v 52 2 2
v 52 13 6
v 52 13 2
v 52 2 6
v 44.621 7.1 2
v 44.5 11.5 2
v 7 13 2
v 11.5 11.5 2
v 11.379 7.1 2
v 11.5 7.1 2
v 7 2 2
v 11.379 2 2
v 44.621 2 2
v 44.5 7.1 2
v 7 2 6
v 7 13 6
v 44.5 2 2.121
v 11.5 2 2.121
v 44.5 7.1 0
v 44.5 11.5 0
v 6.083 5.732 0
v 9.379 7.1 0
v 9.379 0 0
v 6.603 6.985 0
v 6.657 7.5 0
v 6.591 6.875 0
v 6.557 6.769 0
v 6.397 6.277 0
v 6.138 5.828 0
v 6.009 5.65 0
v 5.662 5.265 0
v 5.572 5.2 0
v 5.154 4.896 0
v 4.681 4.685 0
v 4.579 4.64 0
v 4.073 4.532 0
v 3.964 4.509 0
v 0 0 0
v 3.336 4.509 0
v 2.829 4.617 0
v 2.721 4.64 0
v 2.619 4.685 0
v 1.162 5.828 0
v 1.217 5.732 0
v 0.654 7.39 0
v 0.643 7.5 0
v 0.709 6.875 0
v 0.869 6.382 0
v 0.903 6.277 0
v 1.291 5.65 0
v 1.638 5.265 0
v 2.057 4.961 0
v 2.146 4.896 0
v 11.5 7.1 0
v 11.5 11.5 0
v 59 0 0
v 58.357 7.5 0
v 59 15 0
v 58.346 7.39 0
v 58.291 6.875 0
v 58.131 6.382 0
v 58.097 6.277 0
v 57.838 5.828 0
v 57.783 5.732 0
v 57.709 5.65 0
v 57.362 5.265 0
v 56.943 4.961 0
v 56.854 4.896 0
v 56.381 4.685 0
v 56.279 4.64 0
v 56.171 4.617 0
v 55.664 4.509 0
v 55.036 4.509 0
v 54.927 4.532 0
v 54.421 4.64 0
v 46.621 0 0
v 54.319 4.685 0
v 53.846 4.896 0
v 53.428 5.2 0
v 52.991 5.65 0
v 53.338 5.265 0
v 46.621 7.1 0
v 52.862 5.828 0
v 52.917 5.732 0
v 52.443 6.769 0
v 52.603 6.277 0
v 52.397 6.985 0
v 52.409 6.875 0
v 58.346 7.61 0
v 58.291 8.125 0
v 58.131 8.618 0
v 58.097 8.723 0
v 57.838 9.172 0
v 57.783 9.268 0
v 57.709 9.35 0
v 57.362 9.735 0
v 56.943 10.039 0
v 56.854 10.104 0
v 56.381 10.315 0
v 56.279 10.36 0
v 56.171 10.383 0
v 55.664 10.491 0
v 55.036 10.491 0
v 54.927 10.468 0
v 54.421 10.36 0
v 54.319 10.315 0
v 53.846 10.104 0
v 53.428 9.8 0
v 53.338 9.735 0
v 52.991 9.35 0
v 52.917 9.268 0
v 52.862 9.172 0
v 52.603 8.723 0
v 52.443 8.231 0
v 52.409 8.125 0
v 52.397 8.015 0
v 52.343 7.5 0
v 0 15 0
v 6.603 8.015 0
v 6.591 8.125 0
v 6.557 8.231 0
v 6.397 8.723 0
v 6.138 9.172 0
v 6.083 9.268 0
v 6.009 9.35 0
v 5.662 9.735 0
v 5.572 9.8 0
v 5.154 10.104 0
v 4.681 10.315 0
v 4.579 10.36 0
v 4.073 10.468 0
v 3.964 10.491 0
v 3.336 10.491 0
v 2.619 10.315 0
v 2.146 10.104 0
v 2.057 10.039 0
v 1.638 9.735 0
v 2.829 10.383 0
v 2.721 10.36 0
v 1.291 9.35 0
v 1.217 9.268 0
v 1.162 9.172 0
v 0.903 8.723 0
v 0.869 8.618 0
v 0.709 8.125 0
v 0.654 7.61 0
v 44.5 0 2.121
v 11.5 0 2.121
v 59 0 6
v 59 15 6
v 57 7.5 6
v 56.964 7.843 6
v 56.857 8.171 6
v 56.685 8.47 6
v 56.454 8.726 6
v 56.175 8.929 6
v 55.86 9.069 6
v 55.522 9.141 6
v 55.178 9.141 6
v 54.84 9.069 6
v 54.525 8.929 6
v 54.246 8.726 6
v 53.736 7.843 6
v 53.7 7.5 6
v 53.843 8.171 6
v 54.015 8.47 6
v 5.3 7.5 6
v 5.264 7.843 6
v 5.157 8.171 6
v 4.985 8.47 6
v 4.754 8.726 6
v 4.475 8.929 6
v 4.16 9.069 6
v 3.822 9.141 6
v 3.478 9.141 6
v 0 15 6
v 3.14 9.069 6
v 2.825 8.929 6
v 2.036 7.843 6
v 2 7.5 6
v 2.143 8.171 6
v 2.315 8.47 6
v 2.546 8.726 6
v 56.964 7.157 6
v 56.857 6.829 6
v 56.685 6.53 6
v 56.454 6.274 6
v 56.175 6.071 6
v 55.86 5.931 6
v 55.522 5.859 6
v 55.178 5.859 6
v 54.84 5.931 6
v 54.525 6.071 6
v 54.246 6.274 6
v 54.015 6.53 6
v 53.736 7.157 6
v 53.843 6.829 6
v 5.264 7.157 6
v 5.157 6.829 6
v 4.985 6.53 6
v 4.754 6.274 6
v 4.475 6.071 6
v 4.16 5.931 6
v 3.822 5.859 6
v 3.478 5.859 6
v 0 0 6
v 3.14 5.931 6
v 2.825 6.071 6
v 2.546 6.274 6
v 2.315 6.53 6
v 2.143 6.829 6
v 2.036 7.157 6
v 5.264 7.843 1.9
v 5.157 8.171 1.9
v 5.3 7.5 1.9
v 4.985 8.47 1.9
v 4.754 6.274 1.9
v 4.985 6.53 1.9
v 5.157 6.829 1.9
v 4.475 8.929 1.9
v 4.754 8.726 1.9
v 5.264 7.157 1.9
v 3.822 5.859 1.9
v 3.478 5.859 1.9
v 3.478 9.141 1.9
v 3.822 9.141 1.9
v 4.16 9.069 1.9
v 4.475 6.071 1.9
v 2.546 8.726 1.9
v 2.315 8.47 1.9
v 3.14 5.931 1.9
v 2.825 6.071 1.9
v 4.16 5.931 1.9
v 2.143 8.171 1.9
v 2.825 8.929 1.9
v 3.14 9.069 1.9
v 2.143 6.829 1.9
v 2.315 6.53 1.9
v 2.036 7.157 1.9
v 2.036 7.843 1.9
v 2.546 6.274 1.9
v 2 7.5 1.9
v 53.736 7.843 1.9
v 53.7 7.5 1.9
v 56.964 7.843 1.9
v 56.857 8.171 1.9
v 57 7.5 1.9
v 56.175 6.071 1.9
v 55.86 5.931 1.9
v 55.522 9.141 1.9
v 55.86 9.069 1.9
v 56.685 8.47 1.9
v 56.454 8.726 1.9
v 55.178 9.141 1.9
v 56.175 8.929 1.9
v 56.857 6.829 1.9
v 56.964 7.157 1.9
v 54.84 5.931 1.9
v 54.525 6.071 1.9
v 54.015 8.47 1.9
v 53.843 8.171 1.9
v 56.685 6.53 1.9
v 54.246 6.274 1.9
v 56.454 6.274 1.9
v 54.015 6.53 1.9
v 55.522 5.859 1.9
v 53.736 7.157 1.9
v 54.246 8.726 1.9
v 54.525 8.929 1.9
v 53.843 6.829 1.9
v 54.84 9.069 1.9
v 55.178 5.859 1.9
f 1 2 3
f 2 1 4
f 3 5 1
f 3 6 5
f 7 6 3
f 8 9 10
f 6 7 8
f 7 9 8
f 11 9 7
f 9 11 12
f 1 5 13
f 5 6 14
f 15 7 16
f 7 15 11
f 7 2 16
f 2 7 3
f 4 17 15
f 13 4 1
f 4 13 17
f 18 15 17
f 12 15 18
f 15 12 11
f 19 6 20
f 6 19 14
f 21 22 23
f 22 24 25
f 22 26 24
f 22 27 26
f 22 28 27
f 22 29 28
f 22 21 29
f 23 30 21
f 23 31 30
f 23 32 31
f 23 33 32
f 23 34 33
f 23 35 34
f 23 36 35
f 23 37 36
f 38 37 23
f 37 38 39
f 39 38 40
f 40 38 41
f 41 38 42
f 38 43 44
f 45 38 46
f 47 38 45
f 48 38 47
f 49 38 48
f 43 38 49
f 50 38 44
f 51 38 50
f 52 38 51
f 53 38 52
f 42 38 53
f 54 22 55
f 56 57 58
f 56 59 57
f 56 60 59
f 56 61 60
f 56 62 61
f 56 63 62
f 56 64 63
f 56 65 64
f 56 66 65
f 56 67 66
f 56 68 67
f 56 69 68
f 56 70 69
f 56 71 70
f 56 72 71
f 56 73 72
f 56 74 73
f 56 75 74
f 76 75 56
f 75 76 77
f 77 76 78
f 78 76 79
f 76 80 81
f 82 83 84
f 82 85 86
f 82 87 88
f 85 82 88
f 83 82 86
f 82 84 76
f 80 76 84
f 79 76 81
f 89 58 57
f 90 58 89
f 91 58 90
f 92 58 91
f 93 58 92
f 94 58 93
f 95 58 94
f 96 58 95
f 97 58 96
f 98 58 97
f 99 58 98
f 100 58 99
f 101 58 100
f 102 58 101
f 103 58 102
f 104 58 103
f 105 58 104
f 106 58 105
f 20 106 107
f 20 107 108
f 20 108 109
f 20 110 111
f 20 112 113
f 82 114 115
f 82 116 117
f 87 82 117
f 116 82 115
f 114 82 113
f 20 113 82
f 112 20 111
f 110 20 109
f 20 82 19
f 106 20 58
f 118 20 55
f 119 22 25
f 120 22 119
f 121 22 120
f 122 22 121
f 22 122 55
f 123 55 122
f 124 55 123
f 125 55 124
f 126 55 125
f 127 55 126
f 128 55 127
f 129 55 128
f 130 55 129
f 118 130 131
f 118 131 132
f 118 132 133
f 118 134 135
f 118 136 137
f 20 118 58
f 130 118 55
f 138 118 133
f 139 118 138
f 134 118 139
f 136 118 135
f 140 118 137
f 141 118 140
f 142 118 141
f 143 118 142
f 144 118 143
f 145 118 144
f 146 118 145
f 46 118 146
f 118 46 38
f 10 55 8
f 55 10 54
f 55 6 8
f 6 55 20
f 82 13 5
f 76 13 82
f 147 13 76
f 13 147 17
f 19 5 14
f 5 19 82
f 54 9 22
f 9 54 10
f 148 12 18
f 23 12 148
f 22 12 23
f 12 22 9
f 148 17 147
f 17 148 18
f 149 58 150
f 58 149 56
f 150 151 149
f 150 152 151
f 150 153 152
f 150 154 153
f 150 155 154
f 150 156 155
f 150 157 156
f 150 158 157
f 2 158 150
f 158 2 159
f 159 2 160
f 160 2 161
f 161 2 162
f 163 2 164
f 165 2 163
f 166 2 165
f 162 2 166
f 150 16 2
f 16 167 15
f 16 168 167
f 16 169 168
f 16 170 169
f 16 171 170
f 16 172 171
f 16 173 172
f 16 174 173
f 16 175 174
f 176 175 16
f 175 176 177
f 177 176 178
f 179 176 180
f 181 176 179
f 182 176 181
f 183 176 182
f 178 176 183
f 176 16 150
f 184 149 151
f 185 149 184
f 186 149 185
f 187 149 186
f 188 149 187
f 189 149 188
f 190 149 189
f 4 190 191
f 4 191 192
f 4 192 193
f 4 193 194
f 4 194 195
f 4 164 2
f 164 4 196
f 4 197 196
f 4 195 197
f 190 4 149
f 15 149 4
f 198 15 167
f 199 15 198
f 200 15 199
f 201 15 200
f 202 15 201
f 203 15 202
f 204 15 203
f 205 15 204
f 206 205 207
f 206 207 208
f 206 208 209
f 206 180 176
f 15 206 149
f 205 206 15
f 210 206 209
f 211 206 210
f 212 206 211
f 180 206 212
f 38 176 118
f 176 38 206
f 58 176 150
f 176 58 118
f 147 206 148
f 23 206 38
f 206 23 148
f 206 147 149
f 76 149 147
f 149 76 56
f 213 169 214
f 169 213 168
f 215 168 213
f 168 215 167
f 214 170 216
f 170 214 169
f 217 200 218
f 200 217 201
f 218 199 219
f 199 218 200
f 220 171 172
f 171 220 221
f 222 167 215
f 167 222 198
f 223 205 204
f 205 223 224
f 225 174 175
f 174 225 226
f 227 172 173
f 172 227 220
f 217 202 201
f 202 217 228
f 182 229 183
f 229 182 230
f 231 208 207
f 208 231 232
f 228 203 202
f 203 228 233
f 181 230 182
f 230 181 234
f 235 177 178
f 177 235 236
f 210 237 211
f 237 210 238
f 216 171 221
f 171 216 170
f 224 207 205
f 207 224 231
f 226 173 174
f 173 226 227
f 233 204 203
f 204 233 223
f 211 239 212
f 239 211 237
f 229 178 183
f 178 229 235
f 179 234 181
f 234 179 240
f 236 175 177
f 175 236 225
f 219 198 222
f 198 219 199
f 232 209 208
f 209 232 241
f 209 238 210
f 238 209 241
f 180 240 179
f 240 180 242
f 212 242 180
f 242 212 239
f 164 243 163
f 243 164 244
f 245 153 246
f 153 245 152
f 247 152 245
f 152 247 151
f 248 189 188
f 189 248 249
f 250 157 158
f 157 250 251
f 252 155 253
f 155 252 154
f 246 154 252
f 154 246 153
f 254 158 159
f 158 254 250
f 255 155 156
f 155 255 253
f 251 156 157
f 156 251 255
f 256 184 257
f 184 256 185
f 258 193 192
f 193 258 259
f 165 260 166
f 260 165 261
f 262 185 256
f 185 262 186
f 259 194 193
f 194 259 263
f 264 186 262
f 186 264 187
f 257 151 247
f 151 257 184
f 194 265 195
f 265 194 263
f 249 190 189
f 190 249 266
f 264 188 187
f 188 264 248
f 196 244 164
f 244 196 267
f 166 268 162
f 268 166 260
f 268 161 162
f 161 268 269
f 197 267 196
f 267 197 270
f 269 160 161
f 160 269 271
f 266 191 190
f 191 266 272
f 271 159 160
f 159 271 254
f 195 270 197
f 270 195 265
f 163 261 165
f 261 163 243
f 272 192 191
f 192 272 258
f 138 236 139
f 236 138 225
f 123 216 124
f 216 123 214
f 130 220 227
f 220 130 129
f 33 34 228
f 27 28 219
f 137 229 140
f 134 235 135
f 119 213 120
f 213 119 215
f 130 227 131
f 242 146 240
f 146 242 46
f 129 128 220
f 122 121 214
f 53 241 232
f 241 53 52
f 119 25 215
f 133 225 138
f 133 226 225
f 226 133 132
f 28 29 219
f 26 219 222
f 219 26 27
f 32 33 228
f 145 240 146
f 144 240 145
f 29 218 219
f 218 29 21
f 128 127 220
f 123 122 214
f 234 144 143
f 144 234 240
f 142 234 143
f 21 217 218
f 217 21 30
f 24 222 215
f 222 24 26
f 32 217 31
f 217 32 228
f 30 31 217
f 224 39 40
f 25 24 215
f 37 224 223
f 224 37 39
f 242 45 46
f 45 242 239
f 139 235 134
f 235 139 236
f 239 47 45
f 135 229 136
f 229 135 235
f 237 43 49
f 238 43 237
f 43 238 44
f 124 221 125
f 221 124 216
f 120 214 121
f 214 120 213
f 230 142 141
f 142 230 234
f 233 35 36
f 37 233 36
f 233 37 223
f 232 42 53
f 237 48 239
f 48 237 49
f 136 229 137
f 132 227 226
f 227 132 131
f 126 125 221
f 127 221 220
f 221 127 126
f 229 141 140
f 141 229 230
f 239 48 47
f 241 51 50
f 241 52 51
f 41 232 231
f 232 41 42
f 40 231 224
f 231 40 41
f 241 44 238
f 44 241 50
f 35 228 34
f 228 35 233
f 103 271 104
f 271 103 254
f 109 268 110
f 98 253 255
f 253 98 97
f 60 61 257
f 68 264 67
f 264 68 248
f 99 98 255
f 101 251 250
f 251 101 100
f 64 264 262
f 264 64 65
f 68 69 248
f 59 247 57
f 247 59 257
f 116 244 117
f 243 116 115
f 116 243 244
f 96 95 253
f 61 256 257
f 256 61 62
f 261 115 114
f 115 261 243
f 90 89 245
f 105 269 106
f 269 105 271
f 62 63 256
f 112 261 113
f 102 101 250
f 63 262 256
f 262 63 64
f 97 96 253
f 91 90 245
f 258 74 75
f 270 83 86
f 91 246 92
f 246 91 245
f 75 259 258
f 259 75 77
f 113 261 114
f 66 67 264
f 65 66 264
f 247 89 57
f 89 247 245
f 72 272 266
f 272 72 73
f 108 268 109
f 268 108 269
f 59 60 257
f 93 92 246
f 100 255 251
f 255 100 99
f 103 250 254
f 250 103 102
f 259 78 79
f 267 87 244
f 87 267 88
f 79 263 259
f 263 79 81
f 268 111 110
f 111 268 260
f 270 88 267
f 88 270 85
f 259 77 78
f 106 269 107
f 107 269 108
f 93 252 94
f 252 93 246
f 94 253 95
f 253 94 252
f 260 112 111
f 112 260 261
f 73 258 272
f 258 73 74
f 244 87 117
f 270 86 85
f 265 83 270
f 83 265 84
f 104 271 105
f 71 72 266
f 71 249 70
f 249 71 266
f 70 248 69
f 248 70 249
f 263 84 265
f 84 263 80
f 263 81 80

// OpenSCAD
//clamp(40, 13.2, 30, 4.8, 4.4, 2.8);
//clamp(46, 10.6, 36.5, 4.8, 4.5, 1.5);
clamp(45, 11, 33, 4.8, 4.5, 1.5);


module cone() {
    hull() {
        translate([0, 0, 1.9])
        cylinder(d=3.3, h=1, $fn=30);

        cylinder(d=7.3, h=0.1, $fn=30);
    }
}

module clamp(
    width, height, connector_w,
    connector_h, connector_left_offset,
    connector_bottom_offset
) {
    w = width + 14;
    h = height + 4;
    difference() {
        cube([w, h, 6]);

        translate([7, 2, 2]) {
            cube([width, height, 6]);

            translate([
                connector_left_offset,
                height -
                connector_bottom_offset -
                connector_h,
                -2
            ])
            cube([connector_w, connector_h, 6]);

            translate([
                connector_left_offset, (height -
                connector_bottom_offset-connector_h)/2 - 2,
                -2
            ])
            hull() {
                rotate([0, 45, 0])
                cube([
                    3,
                    height - connector_bottom_offset,
                    3
                ], center=true);

                translate([connector_w, 0, 0])
                rotate([0, 45, 0])
                cube([
                    3,
                    height - connector_bottom_offset,
                    3
                ], center=true);
            }
        }
        
        
        
        translate([3.3/2 + 2, (h)/2, 0])
        cylinder(d=3.3, h=7, $fn=30);

        translate([
            w - (3.3/2 + 2),
            (h)/2, 0
        ])
        cylinder(d=3.3, h=7, $fn=30);

        translate([3.3/2 + 2, (h)/2, -1])
        cone();

        translate([w - (3.3/2 + 2), (h)/2, -1])
        cone();
    }
}
